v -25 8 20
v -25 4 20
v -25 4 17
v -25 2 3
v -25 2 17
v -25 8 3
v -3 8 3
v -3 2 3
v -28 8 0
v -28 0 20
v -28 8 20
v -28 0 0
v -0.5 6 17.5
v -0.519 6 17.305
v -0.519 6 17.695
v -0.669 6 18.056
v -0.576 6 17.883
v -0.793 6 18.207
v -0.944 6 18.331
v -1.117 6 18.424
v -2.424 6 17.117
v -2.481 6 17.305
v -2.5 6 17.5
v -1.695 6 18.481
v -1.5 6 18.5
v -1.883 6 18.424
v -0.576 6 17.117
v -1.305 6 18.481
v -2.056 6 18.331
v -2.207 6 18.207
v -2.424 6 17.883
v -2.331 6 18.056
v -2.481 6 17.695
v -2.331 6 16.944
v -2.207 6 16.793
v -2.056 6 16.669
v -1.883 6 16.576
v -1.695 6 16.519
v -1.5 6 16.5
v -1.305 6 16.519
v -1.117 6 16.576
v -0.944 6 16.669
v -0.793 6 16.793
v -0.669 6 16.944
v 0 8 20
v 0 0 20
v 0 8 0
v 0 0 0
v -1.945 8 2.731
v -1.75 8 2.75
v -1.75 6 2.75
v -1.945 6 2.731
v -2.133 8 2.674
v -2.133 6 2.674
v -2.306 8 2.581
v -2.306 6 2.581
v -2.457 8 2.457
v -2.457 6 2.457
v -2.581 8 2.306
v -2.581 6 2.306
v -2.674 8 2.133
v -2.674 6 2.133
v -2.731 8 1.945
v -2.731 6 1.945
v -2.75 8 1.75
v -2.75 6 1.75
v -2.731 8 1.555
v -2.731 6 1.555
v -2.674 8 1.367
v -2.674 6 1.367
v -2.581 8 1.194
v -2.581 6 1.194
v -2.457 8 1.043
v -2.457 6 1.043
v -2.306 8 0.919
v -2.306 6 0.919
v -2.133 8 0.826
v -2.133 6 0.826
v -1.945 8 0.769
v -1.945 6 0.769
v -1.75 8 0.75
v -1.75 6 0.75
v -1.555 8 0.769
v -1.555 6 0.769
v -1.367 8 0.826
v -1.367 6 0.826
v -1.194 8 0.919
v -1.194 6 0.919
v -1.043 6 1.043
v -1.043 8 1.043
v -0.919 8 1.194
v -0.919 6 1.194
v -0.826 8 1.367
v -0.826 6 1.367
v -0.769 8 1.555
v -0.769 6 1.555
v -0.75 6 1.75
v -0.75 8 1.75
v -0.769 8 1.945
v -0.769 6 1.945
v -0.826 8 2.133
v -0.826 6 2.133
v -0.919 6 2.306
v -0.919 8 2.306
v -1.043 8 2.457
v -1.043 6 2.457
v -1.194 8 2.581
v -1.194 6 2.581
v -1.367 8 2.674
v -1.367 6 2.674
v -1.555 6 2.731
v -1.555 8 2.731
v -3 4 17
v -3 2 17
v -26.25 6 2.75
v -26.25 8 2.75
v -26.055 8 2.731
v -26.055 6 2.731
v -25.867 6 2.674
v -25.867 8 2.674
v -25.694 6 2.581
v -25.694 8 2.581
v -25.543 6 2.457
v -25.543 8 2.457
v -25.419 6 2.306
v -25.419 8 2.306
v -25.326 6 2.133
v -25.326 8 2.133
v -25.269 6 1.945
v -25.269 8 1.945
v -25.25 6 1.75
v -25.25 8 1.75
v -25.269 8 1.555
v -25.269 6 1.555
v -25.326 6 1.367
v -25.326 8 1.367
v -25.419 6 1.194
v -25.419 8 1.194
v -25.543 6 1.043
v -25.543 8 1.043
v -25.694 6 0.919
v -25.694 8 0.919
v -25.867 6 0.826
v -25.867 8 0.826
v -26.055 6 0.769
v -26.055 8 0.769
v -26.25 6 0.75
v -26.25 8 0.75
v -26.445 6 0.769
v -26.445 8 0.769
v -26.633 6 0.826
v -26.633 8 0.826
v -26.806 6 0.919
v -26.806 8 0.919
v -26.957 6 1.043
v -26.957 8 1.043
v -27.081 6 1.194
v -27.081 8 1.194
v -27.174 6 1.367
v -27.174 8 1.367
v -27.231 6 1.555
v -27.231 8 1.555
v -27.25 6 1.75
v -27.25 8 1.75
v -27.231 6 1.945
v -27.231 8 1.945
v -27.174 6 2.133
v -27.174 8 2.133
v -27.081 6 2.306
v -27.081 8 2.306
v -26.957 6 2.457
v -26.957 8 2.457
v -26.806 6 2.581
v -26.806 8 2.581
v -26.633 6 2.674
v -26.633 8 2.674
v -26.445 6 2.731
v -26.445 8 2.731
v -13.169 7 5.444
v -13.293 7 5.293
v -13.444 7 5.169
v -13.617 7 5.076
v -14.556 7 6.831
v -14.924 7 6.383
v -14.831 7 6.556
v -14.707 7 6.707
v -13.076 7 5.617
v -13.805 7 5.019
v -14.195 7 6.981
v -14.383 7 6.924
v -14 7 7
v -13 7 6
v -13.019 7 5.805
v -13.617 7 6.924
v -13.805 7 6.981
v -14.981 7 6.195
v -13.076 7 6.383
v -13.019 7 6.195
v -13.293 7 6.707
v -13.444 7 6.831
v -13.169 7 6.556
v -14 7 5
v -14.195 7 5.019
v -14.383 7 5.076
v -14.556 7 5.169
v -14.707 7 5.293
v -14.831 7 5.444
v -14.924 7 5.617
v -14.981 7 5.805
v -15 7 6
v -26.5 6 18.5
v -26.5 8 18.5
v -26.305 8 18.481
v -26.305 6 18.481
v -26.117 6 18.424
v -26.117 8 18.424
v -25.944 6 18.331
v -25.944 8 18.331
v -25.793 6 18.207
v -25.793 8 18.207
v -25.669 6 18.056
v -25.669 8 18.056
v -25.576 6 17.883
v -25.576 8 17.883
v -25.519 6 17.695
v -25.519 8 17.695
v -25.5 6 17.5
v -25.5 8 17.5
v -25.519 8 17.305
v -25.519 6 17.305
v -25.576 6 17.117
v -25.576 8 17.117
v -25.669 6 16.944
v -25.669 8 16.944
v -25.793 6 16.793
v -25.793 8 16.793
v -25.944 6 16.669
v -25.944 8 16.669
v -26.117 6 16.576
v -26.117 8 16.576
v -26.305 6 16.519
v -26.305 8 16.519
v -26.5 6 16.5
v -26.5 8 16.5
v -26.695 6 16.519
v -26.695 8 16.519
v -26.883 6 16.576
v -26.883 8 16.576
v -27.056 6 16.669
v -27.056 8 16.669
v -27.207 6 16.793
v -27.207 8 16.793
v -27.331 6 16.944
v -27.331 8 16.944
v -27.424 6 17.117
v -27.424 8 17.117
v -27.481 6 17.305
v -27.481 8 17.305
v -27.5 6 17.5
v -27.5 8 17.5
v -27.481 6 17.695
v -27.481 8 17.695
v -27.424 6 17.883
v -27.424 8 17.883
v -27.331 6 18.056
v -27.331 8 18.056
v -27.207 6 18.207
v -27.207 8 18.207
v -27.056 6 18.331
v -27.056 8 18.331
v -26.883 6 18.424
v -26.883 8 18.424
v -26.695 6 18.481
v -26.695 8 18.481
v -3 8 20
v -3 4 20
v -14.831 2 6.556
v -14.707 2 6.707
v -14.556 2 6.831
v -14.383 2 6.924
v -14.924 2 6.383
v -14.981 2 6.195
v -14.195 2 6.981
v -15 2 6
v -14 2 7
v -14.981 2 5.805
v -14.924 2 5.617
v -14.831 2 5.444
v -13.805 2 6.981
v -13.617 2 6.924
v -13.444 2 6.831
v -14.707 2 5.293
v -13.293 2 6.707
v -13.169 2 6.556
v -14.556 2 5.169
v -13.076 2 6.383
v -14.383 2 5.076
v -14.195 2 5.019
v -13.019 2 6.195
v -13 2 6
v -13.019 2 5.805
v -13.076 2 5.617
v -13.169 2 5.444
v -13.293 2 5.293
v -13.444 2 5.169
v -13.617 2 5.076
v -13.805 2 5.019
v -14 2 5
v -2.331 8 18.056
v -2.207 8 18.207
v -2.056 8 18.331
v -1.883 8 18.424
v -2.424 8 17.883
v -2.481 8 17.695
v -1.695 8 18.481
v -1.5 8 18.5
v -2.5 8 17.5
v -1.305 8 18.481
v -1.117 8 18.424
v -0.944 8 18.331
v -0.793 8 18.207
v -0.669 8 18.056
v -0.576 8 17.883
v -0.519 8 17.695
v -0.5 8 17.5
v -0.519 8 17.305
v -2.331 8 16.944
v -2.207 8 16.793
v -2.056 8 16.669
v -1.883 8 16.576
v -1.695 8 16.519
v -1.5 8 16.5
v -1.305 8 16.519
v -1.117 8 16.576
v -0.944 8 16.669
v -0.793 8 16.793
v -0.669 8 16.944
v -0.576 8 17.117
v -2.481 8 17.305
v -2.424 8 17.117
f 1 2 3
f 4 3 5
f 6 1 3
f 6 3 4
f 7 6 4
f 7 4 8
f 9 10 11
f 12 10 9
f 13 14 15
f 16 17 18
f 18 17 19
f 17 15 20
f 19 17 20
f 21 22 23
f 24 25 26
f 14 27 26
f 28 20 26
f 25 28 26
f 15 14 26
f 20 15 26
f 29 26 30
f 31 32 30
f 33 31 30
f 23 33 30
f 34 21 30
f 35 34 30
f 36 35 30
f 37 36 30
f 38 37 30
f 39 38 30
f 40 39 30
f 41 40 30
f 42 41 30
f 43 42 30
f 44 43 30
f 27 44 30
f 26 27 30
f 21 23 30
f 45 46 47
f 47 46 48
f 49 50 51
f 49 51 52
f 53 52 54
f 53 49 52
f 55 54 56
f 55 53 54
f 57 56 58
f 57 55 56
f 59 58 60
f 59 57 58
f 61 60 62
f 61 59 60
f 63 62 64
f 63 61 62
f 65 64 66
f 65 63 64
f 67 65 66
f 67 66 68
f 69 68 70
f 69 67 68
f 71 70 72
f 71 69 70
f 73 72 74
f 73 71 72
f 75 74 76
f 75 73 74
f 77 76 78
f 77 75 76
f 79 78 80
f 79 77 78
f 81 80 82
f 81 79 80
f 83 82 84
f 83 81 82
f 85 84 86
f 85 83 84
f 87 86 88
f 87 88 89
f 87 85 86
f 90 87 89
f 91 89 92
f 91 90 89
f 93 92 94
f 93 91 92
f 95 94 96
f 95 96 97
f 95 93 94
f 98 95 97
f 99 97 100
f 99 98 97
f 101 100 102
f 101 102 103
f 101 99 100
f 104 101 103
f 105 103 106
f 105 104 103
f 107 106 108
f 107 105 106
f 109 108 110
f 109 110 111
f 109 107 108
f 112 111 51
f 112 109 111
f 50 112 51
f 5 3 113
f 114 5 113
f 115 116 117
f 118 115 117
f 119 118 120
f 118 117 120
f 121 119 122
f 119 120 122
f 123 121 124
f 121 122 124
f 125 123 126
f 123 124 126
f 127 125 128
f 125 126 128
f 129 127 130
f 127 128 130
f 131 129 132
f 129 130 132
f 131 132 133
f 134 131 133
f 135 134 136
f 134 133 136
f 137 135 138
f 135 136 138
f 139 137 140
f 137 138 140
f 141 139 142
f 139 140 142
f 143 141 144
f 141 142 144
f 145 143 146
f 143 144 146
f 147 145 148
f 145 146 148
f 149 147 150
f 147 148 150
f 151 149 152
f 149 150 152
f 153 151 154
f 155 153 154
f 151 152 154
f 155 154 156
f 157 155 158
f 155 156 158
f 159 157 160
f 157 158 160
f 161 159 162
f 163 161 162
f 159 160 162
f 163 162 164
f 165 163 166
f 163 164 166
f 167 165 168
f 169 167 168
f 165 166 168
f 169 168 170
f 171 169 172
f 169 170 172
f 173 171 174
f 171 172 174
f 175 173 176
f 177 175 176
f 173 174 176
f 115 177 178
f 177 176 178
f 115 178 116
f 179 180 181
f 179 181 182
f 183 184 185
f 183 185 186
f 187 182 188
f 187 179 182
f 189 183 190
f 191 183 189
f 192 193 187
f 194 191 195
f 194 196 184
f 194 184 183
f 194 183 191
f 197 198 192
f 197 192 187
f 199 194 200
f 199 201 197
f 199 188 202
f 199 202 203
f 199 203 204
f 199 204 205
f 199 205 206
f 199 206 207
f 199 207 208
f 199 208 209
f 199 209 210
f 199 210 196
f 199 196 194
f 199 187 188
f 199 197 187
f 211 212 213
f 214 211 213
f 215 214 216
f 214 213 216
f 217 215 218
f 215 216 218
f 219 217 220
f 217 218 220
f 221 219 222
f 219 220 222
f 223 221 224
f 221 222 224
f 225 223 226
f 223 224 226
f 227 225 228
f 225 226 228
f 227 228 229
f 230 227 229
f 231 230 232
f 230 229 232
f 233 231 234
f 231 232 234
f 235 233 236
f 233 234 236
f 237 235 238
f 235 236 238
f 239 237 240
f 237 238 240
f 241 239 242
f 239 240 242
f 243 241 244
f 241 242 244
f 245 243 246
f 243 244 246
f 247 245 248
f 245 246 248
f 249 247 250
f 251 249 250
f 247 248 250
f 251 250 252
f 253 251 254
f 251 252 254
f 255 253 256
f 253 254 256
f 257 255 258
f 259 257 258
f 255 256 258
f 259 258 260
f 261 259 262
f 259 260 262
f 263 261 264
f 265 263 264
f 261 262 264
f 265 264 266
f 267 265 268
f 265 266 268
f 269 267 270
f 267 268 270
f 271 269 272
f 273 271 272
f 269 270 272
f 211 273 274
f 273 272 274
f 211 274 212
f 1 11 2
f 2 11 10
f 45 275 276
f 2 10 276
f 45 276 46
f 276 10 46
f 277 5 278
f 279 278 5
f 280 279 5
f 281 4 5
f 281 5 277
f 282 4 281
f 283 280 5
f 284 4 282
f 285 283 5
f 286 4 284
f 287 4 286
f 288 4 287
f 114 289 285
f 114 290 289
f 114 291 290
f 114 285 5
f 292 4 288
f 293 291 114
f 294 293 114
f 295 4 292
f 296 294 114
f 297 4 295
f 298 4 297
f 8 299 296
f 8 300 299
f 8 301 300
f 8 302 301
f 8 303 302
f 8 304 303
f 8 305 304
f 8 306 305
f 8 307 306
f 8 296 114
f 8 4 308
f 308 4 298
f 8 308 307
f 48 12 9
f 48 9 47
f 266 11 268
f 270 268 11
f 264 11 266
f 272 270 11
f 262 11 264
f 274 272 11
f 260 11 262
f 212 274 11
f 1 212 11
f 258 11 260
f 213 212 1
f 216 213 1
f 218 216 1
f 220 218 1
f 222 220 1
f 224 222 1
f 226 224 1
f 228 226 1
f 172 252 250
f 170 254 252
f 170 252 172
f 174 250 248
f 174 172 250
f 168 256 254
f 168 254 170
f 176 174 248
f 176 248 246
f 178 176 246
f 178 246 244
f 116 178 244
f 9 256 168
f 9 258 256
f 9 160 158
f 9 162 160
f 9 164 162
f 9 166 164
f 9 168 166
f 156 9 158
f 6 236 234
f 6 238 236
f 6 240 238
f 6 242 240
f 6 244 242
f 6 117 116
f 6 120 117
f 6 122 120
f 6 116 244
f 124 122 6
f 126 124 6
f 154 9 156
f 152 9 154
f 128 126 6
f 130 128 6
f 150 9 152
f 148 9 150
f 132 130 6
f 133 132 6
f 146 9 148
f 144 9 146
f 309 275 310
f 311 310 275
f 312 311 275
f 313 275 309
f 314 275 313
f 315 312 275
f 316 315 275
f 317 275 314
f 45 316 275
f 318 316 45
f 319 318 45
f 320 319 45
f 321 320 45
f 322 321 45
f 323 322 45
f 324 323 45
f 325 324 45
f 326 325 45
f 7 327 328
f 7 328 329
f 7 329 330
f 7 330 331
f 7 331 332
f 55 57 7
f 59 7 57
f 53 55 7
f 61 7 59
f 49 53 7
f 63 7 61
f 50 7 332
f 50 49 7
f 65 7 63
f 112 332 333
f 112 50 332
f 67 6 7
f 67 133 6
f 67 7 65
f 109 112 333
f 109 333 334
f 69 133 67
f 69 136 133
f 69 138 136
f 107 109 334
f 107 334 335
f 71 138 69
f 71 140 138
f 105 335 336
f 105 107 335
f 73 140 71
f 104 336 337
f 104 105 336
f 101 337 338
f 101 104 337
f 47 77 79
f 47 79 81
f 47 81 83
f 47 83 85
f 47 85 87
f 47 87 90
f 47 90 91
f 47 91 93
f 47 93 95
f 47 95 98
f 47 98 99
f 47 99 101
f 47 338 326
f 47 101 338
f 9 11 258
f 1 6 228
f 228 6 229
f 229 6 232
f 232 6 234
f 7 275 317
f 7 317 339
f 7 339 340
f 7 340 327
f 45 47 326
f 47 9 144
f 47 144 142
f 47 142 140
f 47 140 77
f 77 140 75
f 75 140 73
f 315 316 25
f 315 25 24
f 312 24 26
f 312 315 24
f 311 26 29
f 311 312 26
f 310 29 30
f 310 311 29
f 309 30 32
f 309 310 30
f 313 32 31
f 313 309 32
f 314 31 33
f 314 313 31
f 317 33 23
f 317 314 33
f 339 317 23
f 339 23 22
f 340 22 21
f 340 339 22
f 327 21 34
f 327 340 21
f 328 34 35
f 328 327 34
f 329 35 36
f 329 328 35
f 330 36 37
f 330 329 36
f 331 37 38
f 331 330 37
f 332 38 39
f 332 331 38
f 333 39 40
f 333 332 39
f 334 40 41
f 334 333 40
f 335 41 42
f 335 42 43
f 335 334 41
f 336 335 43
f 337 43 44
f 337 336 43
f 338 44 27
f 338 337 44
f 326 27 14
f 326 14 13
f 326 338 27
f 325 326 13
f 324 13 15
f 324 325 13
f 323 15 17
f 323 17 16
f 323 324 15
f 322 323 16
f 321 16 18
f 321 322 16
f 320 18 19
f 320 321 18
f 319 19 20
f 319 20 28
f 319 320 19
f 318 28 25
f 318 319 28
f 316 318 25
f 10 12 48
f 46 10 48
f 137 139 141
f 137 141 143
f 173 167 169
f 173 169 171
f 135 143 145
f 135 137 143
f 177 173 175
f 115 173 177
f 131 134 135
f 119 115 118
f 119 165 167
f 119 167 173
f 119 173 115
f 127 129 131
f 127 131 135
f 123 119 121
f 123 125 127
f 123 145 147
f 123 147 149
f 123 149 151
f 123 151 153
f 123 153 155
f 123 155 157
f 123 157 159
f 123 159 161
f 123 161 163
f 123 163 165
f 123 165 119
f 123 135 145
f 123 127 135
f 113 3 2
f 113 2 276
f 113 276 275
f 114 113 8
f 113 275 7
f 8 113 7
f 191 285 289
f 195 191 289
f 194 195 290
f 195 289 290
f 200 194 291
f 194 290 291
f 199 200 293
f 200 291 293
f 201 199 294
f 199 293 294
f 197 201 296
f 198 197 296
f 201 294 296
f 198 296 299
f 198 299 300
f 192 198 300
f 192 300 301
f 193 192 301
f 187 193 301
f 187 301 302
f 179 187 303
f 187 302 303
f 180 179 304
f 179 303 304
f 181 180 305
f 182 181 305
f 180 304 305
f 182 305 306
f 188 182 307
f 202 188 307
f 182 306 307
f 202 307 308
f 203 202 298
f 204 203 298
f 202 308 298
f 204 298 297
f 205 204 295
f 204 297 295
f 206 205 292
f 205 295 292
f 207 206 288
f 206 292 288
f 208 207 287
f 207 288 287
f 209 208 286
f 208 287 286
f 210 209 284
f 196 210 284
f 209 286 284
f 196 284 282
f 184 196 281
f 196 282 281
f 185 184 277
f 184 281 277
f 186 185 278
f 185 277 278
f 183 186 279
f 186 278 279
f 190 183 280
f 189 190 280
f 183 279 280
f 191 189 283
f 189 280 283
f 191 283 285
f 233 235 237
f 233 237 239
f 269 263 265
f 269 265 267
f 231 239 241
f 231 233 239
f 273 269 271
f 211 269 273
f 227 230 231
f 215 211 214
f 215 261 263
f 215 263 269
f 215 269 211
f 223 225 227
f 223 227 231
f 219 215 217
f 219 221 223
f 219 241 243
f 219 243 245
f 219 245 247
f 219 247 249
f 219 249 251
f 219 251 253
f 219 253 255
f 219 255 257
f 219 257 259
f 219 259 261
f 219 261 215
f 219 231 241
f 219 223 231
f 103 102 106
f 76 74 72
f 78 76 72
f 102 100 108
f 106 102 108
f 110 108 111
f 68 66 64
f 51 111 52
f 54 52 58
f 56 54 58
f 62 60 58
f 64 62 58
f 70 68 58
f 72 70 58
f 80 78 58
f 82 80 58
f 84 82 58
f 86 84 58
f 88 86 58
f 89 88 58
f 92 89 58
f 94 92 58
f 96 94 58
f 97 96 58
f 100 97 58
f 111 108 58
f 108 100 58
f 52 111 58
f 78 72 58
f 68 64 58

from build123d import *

# Parameters (mm, degrees)
ESQUISSE3_W             = 28
ESQUISSE3_H             = 20
BOSS_EXTRU_1_DEPTH      = 8
ESQUISSE4_W             = 22
ESQUISSE4_H             = 14
ENL_V_MAT_EXTRU_1_DEPTH = 6
ESQUISSE5_W             = 22
ESQUISSE5_H             = 3
ENL_V_MAT_EXTRU_2_DEPTH = 4
ESQUISSE7_R             = 1
BOSS_EXTRU_2_DEPTH      = 5
ESQUISSE9_R             = 1
ENL_V_MAT_EXTRU_3_DEPTH = 2
ESQUISSE11_R            = 1
ENL_V_MAT_EXTRU_4_DEPTH = 2


with BuildPart() as part:
    # Esquisse3 → Boss.-Extru.1 (new body)
    with BuildSketch(Plane(origin=(0, 0, 0), x_dir=(1, 0, 0), z_dir=(0, 1, 0))):
        with Locations((-14, -10)):
            Rectangle(ESQUISSE3_W, ESQUISSE3_H)
    extrude(amount=BOSS_EXTRU_1_DEPTH)

    # Esquisse4 → Enlèv. mat.-Extru.1 (cut)
    with BuildSketch(Plane(origin=(0, 8, 0), x_dir=(1, 0, 0), z_dir=(0, 1, 0))):
        with Locations((-14, -10)):
            Rectangle(ESQUISSE4_W, ESQUISSE4_H)
    extrude(amount=-ENL_V_MAT_EXTRU_1_DEPTH, mode=Mode.SUBTRACT)

    # Esquisse5 → Enlèv. mat.-Extru.2 (cut)
    with BuildSketch(Plane(origin=(0, 8, 0), x_dir=(1, 0, 0), z_dir=(0, 1, 0))):
        with Locations((-14, -18.5)):
            Rectangle(ESQUISSE5_W, ESQUISSE5_H)
    extrude(amount=-ENL_V_MAT_EXTRU_2_DEPTH, mode=Mode.SUBTRACT)

    # Esquisse7 → Boss.-Extru.2 (add)
    with BuildSketch(Plane(origin=(0, 2, 0), x_dir=(1, 0, 0), z_dir=(0, 1, 0))):
        with Locations(Location((-14, -6, 0), (0, 0, 270))):
            Circle(ESQUISSE7_R)
    extrude(amount=BOSS_EXTRU_2_DEPTH)

    # Esquisse9 → Enlèv. mat.-Extru.3 (cut)
    with BuildSketch(Plane(origin=(0, 8, 0), x_dir=(1, 0, 0), z_dir=(0, 1, 0))):
        with Locations(Location((-26.25, -1.75, 0), (0, 0, 270))):
            Circle(ESQUISSE9_R)
    enl_v_mat_extru_3 = extrude(amount=-ENL_V_MAT_EXTRU_3_DEPTH, mode=Mode.SUBTRACT)

    # Symétrie1: Enlèv. mat.-Extru.3 across plane
    add(enl_v_mat_extru_3.mirror(Plane.ZY.offset(14)), mode=Mode.SUBTRACT)

    # Esquisse11 → Enlèv. mat.-Extru.4 (cut)
    with BuildSketch(Plane(origin=(0, 8, 0), x_dir=(1, 0, 0), z_dir=(0, 1, 0))):
        with Locations(Location((-26.5, -17.5, 0), (0, 0, 270))):
            Circle(ESQUISSE11_R)
    enl_v_mat_extru_4 = extrude(amount=-ENL_V_MAT_EXTRU_4_DEPTH, mode=Mode.SUBTRACT)

    # Symétrie2: Enlèv. mat.-Extru.4 across plane
    add(enl_v_mat_extru_4.mirror(Plane.ZY.offset(14)), mode=Mode.SUBTRACT)


solid = part.part
